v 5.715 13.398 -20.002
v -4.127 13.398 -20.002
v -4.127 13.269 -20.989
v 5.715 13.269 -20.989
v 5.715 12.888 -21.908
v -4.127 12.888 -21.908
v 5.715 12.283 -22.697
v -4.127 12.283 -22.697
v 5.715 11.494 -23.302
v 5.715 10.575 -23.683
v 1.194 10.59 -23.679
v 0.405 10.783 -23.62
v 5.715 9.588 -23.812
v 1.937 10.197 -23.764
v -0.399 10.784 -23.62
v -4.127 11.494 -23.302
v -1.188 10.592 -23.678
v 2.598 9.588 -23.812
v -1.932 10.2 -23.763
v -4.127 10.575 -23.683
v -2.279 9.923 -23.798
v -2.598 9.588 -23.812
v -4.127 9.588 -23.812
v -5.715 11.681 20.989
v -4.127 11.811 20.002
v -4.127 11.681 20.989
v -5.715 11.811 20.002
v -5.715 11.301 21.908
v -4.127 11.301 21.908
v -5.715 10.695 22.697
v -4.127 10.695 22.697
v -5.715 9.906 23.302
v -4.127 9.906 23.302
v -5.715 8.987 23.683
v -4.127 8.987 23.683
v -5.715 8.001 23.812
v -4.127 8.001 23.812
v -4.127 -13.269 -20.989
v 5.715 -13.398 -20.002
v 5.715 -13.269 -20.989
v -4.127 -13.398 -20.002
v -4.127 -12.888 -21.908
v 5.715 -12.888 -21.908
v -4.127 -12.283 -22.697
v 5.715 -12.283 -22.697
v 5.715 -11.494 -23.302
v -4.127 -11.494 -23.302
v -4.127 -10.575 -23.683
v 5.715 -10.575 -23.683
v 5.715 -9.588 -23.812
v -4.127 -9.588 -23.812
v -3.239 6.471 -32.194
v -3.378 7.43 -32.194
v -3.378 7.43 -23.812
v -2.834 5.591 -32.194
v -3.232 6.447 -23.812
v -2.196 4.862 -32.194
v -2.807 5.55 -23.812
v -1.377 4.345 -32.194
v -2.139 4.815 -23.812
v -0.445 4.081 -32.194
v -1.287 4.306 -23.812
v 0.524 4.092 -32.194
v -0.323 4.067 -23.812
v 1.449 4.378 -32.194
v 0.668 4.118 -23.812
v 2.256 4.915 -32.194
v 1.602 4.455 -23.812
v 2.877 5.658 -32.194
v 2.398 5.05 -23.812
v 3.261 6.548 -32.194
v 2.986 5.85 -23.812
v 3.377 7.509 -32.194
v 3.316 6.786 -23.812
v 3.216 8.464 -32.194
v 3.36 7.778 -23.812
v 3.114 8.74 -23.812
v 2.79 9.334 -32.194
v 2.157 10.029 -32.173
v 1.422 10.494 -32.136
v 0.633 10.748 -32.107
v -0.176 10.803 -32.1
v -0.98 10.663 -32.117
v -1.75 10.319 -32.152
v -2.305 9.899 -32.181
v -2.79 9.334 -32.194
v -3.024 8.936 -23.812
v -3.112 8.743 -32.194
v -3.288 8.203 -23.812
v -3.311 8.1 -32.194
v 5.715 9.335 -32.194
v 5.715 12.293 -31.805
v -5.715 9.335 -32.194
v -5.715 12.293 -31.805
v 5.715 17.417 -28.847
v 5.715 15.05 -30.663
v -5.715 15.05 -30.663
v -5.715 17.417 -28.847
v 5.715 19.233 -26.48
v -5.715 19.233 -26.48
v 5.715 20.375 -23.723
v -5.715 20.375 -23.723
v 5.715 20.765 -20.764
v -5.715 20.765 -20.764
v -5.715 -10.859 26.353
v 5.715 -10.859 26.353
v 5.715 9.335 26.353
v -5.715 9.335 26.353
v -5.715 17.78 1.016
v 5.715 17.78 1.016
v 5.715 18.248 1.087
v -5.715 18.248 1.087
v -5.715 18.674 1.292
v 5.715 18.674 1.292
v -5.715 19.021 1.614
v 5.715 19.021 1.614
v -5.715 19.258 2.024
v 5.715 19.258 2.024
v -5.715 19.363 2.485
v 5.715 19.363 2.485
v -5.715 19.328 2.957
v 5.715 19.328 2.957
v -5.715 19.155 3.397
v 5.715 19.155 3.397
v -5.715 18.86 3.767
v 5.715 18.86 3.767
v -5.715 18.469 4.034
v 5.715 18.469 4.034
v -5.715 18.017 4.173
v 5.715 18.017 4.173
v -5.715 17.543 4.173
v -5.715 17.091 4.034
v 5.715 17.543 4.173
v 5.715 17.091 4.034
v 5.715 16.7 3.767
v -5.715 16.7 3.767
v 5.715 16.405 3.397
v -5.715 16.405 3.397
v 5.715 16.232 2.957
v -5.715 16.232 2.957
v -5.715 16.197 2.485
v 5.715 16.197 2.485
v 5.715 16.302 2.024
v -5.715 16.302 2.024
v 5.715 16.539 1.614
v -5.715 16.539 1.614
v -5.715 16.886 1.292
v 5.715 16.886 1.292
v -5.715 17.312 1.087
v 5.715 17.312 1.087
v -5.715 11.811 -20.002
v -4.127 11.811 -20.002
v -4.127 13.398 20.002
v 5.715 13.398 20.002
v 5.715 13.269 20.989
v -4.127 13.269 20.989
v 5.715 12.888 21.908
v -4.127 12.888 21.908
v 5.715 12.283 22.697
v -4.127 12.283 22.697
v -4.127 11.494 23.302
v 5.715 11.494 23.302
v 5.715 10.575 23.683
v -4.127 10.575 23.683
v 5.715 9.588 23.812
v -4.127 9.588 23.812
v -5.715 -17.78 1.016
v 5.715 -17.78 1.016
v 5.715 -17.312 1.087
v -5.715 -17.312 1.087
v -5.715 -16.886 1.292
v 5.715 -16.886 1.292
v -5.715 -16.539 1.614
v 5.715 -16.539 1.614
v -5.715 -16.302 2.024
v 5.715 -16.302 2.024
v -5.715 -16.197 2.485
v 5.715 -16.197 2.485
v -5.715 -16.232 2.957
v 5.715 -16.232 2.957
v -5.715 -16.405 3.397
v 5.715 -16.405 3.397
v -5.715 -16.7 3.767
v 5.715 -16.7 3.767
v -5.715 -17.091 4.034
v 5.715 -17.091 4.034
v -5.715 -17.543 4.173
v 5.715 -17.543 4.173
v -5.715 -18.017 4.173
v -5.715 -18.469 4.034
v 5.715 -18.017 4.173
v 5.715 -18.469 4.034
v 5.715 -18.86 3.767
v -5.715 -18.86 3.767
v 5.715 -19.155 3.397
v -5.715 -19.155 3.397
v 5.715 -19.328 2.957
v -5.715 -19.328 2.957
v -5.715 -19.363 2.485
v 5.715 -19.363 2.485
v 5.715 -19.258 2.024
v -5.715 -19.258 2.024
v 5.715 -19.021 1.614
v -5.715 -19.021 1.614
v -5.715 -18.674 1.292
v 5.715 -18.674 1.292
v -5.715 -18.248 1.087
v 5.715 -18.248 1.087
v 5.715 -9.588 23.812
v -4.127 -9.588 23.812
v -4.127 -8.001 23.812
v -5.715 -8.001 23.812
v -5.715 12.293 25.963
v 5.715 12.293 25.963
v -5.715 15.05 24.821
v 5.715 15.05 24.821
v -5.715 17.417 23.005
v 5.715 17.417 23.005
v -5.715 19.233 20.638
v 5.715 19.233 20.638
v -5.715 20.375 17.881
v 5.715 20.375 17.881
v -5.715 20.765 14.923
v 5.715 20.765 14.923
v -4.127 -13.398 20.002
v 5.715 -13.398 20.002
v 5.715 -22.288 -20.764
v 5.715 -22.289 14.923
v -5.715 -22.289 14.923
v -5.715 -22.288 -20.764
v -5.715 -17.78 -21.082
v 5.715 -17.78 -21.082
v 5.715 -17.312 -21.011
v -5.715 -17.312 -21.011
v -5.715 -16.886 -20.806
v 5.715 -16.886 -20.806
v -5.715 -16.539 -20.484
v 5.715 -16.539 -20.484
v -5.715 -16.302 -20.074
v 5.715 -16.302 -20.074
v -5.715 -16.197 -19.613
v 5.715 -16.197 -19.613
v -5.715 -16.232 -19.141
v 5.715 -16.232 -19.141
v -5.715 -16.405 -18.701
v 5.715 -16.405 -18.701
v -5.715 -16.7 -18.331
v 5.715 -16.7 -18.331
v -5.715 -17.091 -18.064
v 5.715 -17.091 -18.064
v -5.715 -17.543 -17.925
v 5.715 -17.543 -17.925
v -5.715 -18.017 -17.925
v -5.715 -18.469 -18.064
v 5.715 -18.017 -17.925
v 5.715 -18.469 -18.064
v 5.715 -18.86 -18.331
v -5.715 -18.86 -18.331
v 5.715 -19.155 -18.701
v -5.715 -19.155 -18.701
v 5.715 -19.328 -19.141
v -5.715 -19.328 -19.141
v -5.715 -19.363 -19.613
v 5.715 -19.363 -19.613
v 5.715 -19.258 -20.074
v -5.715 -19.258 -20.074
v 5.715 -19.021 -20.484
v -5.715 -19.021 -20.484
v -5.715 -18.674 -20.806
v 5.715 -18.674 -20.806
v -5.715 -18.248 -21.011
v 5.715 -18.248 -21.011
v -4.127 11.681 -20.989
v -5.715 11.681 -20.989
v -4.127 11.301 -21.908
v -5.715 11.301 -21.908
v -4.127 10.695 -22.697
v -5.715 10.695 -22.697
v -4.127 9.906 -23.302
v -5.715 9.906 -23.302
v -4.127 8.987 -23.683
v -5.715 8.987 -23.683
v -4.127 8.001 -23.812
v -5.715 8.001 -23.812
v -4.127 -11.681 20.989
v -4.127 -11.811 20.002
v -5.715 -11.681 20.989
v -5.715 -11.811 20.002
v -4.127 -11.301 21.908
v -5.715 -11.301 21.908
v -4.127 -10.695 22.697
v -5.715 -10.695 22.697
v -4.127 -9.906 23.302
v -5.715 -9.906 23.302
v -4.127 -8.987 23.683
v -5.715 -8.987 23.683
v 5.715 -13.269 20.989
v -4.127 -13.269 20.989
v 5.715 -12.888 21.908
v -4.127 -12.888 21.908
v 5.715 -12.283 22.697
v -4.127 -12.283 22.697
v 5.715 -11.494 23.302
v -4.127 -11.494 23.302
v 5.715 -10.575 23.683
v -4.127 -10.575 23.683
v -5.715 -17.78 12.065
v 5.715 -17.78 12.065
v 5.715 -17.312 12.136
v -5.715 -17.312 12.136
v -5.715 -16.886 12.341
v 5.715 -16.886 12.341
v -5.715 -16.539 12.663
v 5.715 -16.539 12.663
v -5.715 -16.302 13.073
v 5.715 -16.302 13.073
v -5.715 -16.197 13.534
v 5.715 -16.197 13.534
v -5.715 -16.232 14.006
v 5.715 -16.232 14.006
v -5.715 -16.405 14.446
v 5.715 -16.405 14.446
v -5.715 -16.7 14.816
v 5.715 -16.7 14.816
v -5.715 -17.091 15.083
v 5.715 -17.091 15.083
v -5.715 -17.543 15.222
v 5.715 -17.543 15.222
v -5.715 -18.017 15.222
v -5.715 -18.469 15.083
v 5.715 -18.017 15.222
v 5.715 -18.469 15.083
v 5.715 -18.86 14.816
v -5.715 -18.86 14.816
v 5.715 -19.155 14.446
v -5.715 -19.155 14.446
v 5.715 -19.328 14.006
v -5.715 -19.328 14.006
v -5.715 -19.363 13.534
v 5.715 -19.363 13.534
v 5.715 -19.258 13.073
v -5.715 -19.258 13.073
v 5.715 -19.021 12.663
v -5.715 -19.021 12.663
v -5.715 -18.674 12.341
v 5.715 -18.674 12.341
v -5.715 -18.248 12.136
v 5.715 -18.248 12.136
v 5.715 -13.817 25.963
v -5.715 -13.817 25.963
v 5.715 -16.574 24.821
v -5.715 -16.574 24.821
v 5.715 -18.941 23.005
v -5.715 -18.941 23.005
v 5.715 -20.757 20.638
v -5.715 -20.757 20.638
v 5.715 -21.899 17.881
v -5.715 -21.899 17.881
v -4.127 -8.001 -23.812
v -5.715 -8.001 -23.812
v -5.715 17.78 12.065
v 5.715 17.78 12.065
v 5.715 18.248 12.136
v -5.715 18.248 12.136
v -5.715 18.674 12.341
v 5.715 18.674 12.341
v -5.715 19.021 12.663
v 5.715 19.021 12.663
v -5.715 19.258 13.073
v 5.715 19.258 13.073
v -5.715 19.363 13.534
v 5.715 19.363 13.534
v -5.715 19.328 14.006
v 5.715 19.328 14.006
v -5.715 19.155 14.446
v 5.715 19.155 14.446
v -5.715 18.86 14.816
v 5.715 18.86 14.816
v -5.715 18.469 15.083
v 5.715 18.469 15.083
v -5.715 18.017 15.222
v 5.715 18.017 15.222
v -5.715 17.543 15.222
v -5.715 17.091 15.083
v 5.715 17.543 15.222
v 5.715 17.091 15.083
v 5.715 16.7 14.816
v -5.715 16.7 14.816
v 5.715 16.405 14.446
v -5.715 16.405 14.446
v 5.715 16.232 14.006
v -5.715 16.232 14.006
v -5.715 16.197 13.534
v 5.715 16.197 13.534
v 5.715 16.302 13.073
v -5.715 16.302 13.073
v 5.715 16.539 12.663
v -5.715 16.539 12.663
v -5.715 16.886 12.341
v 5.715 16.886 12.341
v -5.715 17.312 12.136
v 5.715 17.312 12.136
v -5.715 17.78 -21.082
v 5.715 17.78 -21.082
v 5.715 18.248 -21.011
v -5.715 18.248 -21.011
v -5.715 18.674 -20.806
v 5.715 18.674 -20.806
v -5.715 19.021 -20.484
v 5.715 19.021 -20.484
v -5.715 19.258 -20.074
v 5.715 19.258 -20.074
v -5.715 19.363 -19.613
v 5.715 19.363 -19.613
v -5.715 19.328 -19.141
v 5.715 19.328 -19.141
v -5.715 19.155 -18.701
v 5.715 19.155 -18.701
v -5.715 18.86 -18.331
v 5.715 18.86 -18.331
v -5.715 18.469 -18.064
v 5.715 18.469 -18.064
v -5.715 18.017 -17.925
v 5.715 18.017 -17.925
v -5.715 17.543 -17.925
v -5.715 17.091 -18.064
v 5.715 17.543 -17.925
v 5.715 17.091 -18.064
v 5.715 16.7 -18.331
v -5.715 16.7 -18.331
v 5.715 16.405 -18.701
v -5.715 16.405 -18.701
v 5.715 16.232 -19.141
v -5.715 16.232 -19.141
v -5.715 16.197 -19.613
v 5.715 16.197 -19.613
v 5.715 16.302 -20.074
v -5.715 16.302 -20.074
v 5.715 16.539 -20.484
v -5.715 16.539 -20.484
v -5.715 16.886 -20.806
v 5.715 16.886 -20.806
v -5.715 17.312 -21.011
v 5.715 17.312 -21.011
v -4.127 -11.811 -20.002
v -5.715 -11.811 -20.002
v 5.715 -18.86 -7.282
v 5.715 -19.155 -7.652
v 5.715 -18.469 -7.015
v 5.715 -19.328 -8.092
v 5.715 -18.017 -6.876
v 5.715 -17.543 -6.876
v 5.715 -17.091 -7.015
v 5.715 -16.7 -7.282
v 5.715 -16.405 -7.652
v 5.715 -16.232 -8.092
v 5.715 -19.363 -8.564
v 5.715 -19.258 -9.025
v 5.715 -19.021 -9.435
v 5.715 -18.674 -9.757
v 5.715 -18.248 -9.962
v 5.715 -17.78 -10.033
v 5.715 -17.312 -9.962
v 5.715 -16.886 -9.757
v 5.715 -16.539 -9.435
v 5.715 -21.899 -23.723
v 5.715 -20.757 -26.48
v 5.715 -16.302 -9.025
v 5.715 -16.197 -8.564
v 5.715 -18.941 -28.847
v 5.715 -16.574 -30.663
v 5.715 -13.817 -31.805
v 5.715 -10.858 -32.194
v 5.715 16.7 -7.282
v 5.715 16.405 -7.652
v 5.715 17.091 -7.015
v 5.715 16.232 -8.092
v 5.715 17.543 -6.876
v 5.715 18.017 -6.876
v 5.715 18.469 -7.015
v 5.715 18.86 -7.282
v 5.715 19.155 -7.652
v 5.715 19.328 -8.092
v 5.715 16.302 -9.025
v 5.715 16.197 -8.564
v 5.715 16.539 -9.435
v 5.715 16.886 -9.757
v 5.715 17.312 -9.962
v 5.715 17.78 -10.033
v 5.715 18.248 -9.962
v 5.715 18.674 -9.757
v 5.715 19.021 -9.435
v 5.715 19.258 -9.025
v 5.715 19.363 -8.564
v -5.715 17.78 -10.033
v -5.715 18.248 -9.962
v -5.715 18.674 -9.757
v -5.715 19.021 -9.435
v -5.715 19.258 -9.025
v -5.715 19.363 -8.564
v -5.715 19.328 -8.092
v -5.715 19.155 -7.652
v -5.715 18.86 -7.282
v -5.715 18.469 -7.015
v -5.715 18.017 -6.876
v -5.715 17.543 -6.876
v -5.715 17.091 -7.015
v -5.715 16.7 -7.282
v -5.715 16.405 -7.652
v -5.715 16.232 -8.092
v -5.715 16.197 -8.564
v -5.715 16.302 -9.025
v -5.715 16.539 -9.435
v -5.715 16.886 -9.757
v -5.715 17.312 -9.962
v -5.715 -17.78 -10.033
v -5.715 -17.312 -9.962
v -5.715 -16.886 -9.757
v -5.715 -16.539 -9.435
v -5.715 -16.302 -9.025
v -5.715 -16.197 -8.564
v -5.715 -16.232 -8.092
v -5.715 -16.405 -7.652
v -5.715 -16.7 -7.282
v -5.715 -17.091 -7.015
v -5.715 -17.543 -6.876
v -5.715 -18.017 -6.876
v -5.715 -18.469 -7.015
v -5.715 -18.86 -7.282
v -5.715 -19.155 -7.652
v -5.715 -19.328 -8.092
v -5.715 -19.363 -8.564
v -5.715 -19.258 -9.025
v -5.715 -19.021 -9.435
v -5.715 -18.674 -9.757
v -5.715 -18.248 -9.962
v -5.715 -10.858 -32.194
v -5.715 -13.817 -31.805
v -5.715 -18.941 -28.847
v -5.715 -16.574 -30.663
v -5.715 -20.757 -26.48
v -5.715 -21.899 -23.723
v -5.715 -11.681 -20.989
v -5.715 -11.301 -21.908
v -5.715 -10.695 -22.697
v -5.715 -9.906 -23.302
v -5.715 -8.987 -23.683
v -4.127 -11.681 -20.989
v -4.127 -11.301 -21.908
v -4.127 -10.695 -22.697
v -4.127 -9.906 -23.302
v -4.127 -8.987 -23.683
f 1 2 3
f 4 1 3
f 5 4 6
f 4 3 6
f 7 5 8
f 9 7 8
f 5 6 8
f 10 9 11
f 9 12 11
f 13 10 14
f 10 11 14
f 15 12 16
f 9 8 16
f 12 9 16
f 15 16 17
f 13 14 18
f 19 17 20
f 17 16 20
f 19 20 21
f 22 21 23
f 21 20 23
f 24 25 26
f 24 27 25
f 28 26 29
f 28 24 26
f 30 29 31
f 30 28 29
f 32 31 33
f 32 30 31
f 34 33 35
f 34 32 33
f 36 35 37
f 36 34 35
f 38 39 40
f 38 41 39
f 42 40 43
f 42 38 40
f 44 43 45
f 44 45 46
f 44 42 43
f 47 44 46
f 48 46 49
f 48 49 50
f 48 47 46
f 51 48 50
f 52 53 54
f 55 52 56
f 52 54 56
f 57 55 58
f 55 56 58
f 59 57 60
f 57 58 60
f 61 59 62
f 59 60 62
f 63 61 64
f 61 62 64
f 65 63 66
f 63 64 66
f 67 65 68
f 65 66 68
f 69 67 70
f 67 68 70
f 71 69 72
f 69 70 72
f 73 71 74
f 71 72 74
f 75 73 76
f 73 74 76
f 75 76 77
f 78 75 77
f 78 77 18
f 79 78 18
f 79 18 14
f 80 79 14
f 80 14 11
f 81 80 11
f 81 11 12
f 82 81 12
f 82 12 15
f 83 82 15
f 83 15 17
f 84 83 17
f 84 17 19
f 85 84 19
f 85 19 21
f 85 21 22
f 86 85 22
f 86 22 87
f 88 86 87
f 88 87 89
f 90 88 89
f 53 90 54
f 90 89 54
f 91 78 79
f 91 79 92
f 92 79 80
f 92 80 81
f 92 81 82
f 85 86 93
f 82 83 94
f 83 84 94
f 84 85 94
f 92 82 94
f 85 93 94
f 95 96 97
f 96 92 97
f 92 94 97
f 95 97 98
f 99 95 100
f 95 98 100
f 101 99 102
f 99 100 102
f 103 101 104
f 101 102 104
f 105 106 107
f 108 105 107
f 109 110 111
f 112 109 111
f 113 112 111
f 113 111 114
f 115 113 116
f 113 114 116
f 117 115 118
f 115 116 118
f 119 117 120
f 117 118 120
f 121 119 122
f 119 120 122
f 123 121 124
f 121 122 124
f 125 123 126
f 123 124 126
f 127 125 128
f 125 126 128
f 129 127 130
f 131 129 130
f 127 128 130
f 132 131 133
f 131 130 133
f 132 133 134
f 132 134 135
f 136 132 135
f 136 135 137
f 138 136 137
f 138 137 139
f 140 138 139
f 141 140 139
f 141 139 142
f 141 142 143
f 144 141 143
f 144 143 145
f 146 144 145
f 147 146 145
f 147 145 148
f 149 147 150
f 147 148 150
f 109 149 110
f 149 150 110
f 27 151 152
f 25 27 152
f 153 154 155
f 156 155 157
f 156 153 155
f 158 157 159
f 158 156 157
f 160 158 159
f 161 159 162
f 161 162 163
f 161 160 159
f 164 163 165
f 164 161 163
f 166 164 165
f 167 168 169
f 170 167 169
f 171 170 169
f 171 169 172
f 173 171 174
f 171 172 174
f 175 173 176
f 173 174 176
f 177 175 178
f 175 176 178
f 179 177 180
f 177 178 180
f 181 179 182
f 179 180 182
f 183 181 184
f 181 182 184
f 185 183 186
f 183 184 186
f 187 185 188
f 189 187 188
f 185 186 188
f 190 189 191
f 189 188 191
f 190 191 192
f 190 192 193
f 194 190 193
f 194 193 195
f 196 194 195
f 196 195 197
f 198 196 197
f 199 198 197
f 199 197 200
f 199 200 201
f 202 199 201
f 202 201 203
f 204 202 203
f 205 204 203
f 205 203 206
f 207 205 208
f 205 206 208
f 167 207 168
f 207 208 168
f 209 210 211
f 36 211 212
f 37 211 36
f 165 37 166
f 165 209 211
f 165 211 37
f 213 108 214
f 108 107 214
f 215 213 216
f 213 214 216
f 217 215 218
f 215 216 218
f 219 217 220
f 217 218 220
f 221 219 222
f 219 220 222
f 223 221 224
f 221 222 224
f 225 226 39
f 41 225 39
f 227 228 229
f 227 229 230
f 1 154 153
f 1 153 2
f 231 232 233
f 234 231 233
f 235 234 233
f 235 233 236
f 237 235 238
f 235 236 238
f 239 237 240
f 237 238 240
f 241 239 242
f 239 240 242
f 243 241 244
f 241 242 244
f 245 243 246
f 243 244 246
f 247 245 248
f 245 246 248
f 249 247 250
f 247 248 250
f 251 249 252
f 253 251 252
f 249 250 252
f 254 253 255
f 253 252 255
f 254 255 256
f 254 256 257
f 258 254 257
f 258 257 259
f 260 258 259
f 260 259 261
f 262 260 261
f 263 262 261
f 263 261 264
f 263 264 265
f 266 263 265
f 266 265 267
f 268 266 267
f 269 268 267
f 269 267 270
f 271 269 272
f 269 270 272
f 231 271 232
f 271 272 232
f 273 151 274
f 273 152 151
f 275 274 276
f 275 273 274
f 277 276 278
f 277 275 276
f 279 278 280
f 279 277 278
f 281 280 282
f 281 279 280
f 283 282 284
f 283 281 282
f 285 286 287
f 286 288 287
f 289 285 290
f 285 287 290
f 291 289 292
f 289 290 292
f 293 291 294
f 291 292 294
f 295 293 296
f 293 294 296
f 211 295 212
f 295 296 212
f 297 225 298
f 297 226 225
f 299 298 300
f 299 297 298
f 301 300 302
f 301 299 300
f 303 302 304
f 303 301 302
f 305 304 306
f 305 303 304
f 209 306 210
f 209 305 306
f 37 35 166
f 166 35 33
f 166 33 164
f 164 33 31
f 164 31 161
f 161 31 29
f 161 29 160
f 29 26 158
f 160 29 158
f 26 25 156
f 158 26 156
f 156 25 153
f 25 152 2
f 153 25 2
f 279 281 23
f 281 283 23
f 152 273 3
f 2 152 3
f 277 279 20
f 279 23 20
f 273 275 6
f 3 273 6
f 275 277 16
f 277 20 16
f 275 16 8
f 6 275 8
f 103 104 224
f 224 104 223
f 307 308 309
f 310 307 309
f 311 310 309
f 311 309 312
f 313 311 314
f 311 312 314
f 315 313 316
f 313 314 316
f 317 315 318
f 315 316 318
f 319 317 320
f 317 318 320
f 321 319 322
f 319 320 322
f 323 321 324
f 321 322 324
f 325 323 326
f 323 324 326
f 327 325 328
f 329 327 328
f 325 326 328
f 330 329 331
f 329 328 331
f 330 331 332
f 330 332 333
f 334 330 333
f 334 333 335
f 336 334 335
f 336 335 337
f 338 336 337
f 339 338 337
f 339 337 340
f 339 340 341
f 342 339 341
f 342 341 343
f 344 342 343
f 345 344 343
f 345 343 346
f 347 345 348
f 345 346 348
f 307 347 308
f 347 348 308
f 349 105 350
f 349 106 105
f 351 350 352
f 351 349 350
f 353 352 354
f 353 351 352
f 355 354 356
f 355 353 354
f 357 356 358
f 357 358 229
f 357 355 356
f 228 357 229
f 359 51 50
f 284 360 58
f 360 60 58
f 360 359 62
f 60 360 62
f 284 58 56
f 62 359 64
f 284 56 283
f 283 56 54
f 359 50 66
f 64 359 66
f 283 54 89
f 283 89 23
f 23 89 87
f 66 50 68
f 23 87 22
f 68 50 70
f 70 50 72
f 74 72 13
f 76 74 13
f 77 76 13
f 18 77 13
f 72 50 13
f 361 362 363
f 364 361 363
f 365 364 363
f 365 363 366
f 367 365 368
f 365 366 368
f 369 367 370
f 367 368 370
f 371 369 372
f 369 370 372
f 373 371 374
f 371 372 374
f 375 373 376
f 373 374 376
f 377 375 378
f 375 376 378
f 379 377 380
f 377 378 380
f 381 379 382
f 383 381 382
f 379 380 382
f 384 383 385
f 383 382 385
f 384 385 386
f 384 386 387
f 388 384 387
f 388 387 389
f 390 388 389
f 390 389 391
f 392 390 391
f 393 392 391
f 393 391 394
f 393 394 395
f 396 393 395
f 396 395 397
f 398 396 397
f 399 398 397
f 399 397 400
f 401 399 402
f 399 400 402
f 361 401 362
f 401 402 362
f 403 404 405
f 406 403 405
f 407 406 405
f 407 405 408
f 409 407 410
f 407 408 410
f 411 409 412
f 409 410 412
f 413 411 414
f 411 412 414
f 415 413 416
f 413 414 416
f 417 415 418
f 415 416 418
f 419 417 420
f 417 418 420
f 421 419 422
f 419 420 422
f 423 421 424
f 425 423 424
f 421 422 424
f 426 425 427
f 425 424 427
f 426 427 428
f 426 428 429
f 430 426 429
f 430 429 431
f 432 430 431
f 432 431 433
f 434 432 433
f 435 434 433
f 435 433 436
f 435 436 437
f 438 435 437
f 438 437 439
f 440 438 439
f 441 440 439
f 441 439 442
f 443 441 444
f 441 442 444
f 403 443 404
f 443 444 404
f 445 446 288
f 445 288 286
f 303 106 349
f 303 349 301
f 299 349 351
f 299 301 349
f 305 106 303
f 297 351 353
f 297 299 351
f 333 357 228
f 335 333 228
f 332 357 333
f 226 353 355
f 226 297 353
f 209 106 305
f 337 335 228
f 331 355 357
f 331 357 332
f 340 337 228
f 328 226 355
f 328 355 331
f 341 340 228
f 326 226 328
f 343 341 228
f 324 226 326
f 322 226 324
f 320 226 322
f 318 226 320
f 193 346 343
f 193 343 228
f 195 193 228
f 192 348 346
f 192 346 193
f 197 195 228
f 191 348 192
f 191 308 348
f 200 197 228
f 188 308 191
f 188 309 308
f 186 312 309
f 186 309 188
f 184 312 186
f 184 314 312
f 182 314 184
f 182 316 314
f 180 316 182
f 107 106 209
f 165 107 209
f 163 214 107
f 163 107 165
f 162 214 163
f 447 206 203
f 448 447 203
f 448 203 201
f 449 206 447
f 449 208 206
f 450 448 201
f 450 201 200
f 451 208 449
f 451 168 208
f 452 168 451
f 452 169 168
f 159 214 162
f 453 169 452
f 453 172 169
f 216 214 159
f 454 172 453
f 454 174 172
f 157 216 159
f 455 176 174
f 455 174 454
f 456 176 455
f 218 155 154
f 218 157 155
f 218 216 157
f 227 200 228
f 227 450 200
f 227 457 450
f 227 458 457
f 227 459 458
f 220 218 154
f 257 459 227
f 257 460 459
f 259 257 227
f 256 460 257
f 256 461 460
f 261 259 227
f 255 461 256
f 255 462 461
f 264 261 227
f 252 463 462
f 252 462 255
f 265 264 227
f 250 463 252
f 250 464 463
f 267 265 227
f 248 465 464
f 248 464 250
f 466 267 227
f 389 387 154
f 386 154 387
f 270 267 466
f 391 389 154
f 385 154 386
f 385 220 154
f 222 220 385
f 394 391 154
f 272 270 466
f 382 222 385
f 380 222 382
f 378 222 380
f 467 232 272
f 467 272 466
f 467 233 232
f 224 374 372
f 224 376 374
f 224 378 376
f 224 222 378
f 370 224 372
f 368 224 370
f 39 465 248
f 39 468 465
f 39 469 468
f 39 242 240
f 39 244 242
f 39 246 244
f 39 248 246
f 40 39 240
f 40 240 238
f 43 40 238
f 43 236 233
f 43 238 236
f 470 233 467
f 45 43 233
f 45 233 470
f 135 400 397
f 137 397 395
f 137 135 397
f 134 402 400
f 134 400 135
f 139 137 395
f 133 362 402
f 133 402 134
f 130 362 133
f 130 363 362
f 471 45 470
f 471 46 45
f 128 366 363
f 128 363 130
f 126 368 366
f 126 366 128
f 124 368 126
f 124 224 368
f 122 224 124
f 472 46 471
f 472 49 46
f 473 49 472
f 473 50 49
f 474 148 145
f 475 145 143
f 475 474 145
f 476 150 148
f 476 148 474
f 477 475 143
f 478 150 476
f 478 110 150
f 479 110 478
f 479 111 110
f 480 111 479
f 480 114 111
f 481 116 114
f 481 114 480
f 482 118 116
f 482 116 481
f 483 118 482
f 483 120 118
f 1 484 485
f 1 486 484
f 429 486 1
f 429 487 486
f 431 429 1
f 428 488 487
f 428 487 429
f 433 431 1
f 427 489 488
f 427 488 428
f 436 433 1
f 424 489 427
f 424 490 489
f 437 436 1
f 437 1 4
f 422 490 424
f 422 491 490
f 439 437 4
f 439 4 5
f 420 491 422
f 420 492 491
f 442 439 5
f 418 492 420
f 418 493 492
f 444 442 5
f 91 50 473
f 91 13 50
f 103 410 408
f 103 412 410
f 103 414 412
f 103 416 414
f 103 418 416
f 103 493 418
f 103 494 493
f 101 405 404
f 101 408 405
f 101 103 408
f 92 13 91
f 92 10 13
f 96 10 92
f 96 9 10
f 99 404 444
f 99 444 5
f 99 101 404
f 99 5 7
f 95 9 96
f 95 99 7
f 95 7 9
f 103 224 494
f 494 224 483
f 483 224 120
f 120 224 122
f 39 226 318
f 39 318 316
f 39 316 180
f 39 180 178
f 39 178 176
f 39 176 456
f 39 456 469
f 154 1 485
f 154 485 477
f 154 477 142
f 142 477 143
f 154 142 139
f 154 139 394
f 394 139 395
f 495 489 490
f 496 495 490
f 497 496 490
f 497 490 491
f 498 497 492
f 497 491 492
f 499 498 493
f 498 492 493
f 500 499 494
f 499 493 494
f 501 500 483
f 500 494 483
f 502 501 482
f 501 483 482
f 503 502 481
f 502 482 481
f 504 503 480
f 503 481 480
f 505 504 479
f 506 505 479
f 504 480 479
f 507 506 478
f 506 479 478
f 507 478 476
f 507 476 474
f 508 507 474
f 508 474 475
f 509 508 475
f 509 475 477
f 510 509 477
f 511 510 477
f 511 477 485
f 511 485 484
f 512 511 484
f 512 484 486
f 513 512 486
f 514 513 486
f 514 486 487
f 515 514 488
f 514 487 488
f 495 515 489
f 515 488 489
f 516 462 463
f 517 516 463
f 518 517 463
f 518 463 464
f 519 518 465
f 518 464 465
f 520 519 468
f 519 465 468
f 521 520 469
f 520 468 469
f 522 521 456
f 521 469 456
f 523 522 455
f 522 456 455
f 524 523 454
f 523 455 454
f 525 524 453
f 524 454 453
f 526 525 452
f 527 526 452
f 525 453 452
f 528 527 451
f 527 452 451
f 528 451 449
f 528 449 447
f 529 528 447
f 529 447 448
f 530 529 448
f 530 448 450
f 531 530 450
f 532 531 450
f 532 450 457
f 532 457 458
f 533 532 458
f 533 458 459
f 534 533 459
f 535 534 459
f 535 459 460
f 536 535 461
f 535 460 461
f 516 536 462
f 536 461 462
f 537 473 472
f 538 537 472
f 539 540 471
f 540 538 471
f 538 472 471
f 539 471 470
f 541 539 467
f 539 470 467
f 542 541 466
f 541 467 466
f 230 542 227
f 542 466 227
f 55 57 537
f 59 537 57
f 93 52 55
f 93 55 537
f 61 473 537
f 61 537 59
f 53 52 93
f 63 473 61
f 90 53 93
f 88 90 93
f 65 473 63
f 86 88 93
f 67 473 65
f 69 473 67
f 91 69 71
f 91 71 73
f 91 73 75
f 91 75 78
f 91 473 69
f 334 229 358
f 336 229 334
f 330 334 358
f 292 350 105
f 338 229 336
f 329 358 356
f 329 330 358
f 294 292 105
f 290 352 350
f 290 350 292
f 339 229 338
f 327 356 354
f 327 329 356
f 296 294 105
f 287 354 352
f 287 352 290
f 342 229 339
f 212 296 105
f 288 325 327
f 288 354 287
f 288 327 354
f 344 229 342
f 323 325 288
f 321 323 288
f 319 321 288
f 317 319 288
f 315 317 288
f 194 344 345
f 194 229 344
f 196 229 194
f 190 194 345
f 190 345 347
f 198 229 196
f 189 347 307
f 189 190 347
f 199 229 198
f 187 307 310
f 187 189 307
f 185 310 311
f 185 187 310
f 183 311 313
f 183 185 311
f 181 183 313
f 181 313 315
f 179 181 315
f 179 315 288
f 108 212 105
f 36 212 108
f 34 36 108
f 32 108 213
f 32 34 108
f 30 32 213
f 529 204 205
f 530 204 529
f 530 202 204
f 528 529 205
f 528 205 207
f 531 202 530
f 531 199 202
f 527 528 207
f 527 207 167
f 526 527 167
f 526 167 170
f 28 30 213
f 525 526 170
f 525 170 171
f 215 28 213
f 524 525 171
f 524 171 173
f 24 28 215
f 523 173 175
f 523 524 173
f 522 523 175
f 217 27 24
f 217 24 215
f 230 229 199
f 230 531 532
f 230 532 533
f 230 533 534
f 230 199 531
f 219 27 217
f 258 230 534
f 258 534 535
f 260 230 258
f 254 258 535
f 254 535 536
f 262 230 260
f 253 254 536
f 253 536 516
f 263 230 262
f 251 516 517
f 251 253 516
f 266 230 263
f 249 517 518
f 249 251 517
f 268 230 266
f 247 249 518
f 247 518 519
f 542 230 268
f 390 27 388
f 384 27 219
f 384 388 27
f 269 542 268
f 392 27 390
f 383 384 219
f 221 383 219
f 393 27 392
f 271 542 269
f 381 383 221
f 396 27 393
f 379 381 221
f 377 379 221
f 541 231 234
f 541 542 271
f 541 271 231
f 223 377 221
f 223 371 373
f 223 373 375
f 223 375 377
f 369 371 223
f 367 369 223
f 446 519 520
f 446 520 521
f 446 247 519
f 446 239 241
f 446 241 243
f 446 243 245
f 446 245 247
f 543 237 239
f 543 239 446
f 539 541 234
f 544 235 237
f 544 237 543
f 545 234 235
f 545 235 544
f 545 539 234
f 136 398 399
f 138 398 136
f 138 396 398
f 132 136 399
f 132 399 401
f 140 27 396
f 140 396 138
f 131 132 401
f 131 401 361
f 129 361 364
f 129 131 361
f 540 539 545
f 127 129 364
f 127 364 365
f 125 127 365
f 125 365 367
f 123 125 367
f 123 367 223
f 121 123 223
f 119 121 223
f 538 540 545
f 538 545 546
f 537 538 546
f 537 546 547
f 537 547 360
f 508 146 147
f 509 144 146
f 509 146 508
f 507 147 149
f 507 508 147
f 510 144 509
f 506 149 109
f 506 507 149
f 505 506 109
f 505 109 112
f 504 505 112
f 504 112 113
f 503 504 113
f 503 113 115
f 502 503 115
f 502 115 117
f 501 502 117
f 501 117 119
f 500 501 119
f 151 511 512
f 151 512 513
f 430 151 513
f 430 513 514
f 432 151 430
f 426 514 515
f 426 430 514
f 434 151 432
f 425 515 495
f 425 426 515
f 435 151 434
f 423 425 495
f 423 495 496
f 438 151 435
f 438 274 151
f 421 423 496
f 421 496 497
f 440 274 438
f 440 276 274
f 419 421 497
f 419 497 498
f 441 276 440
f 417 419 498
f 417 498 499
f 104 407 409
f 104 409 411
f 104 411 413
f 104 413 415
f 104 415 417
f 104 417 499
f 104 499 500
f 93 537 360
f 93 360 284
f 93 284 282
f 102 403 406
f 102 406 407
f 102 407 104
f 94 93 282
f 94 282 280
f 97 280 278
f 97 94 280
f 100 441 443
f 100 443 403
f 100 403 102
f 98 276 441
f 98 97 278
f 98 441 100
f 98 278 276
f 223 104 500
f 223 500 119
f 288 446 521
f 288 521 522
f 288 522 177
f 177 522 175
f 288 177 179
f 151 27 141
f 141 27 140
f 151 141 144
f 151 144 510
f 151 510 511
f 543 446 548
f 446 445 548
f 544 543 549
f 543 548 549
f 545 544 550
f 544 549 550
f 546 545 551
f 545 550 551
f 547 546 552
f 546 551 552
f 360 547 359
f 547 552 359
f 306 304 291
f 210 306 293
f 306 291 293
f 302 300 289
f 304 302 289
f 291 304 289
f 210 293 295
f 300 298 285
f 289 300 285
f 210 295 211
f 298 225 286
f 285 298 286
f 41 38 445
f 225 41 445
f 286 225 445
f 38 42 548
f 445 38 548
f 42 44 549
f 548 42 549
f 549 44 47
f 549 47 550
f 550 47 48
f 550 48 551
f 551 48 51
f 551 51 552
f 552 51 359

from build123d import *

# Parameters (mm, degrees)
SKETCH1_W                   = 58.547
SKETCH1_H                   = 44.577
SKETCH1_W_2                 = 47.625
SKETCH1_H_2                 = 26.797
BOSS_EXTRUDE1_DEPTH         = 5.715
BOSS_EXTRUDE2_REACH         = 57.19
SKETCH9_W                   = 1.5875
SKETCH9_H                   = 1.5875
FILLET11_R                  = 3.81
FILLET12_R                  = 3.81
F_1_4_CLEARANCE_HOLE1_D     = 6.7564
F_1_4_CLEARANCE_HOLE1_DEPTH = 8.89
F_1_4_CLEARANCE_HOLE1_TIP   = 2.029827343
F_6_32_TAPPED_HOLE1_D       = 2.7051
SKETCH22_W                  = 58.547
SKETCH22_H                  = 9.177220827
CUT_EXTRUDE4_DEPTH          = 41.791028073
FILLET14_R                  = 11.43
FILLET13_R                  = 11.43
SKETCH24_R                  = 1.5875
CUT_EXTRUDE5_DEPTH          = 11.43


with BuildPart() as part:
    # Sketch1 → Boss-Extrude1 (new, symmetric)
    with BuildSketch(Plane(origin=(0, 0, 0), x_dir=(0, 0, -1), z_dir=(1, 0, 0))):
        with Locations((2.921, 0)):
            Rectangle(SKETCH1_W, SKETCH1_H)
        Rectangle(SKETCH1_W_2, SKETCH1_H_2, mode=Mode.SUBTRACT)
    extrude(amount=BOSS_EXTRUDE1_DEPTH, both=True)

    # Sketch9 → Boss-Extrude2 (add, up to next)
    with BuildSketch(Plane.XY.offset(-23.8125), mode=Mode.PRIVATE) as boss_extrude2_sk1:
        with Locations((-4.92125, 12.60475)):
            Rectangle(SKETCH9_W, SKETCH9_H)
    boss_extrude2_tool1 = extrude(boss_extrude2_sk1.sketch, amount=BOSS_EXTRUDE2_REACH, mode=Mode.PRIVATE) - part.part
    # Sketch9 → Boss-Extrude2 (add, up to next)
    with BuildSketch(Plane.XY.offset(-23.8125), mode=Mode.PRIVATE) as boss_extrude2_sk2:
        with Locations((-4.92125, -12.60475)):
            Rectangle(SKETCH9_W, SKETCH9_H)
    boss_extrude2_tool2 = extrude(boss_extrude2_sk2.sketch, amount=BOSS_EXTRUDE2_REACH, mode=Mode.PRIVATE) - part.part
    add(boss_extrude2_tool1.solids().sort_by_distance((-4.92125, 12.60475, -23.8125))[0])
    add(boss_extrude2_tool2.solids().sort_by_distance((-4.92125, -12.60475, -23.8125))[0])

    # Fillet11
    fillet11_edges = [part.edges().sort_by_distance(p)[0] for p in [
        (-4.92125, -11.811, 23.8125),
        (-4.92125, -11.811, -23.8125),
        (-4.92125, 11.811, 23.8125),
        (-4.92125, 11.811, -23.8125),
    ]]
    fillet(fillet11_edges, radius=FILLET11_R)

    # Fillet12
    fillet12_edges = [part.edges().sort_by_distance(p)[0] for p in [
        (0.79375, 13.3985, 23.8125),
        (0.79375, -13.3985, 23.8125),
        (0.79375, -13.3985, -23.8125),
        (0.79375, 13.3985, -23.8125),
    ]]
    fillet(fillet12_edges, radius=FILLET12_R)

    # 1/4 Clearance Hole1
    with Locations(Plane(origin=(-2.530789808, 6.493019647, -32.1945), x_dir=(1, 0, 0), z_dir=(0, 0, -1))):
        with Locations((2.530789808, -0.936480353)):
            Hole(F_1_4_CLEARANCE_HOLE1_D / 2, depth=F_1_4_CLEARANCE_HOLE1_DEPTH)
            with Locations((0, 0, -(F_1_4_CLEARANCE_HOLE1_DEPTH + F_1_4_CLEARANCE_HOLE1_TIP / 2))):  # 118° drill point
                Cone(0, F_1_4_CLEARANCE_HOLE1_D / 2, F_1_4_CLEARANCE_HOLE1_TIP, mode=Mode.SUBTRACT)

    # #6-32 Tapped Hole1 (through all)
    with Locations(Plane(origin=(5.715, 17.955600219, 19.212274833), x_dir=(0, 0, 1), z_dir=(1, 0, 0))):
        with Locations((-27.657774833, 0.175600219), (-16.608774833, 0.175600219), (-5.559774833, 0.175600219), (-38.706774833, 0.175600219), (-38.706774833, 35.735600219), (-27.657774833, 35.735600219), (-16.608774833, 35.735600219), (-5.559774833, 35.735600219)):
            Hole(F_6_32_TAPPED_HOLE1_D / 2)

    # Sketch22 → Cut-Extrude4 (cut, through all)
    with BuildSketch(Plane.ZY.offset(5.715)):
        with Locations((-2.921, 25.353110414)):
            Rectangle(SKETCH22_W, SKETCH22_H)
    extrude(amount=-CUT_EXTRUDE4_DEPTH, mode=Mode.SUBTRACT)

    # Fillet14
    fillet14_edges = [part.edges().sort_by_distance(p)[0] for p in [
        (0, 20.7645, 26.3525),
        (0, -22.2885, 26.3525),
    ]]
    fillet(fillet14_edges, radius=FILLET14_R)

    # Fillet13
    # the kernel refuses this fillet: 11.43 mm, written as the material it takes off along each edge
    with BuildSketch(Plane(origin=(-34.29, 20.7645, -32.1945), x_dir=(0, 0, 1), z_dir=(1, 0, 0)), Plane(origin=(34.29, -22.2885, -32.1945), x_dir=(0, 0, 1), z_dir=(-1, 0, 0))) as fillet13_piece_1:
        with BuildLine():
            CenterArc((FILLET13_R, FILLET13_R), FILLET13_R, 180, 90)
            Line((0, FILLET13_R), (0, 0))
            Line((0, 0), (FILLET13_R, 0))
        make_face()
    extrude(amount=68.58, mode=Mode.SUBTRACT)

    # Sketch24 → Cut-Extrude5 (cut)
    with BuildSketch(Plane(origin=(5.715, 0, 0), x_dir=(0, 0, -1), z_dir=(1, 0, 0))):
        with Locations((19.4945, -17.78)):
            Circle(SKETCH24_R)
        with Locations((8.4455, -17.78)):
            Circle(SKETCH24_R)
        with Locations((-2.6035, -17.78)):
            Circle(SKETCH24_R)
        with Locations((-13.6525, -17.78)):
            Circle(SKETCH24_R)
        with Locations((-13.6525, 17.78)):
            Circle(SKETCH24_R)
        with Locations((-2.6035, 17.78)):
            Circle(SKETCH24_R)
        with Locations((8.4455, 17.78)):
            Circle(SKETCH24_R)
        with Locations((19.4945, 17.78)):
            Circle(SKETCH24_R)
    extrude(amount=-CUT_EXTRUDE5_DEPTH, mode=Mode.SUBTRACT)


solid = part.part
